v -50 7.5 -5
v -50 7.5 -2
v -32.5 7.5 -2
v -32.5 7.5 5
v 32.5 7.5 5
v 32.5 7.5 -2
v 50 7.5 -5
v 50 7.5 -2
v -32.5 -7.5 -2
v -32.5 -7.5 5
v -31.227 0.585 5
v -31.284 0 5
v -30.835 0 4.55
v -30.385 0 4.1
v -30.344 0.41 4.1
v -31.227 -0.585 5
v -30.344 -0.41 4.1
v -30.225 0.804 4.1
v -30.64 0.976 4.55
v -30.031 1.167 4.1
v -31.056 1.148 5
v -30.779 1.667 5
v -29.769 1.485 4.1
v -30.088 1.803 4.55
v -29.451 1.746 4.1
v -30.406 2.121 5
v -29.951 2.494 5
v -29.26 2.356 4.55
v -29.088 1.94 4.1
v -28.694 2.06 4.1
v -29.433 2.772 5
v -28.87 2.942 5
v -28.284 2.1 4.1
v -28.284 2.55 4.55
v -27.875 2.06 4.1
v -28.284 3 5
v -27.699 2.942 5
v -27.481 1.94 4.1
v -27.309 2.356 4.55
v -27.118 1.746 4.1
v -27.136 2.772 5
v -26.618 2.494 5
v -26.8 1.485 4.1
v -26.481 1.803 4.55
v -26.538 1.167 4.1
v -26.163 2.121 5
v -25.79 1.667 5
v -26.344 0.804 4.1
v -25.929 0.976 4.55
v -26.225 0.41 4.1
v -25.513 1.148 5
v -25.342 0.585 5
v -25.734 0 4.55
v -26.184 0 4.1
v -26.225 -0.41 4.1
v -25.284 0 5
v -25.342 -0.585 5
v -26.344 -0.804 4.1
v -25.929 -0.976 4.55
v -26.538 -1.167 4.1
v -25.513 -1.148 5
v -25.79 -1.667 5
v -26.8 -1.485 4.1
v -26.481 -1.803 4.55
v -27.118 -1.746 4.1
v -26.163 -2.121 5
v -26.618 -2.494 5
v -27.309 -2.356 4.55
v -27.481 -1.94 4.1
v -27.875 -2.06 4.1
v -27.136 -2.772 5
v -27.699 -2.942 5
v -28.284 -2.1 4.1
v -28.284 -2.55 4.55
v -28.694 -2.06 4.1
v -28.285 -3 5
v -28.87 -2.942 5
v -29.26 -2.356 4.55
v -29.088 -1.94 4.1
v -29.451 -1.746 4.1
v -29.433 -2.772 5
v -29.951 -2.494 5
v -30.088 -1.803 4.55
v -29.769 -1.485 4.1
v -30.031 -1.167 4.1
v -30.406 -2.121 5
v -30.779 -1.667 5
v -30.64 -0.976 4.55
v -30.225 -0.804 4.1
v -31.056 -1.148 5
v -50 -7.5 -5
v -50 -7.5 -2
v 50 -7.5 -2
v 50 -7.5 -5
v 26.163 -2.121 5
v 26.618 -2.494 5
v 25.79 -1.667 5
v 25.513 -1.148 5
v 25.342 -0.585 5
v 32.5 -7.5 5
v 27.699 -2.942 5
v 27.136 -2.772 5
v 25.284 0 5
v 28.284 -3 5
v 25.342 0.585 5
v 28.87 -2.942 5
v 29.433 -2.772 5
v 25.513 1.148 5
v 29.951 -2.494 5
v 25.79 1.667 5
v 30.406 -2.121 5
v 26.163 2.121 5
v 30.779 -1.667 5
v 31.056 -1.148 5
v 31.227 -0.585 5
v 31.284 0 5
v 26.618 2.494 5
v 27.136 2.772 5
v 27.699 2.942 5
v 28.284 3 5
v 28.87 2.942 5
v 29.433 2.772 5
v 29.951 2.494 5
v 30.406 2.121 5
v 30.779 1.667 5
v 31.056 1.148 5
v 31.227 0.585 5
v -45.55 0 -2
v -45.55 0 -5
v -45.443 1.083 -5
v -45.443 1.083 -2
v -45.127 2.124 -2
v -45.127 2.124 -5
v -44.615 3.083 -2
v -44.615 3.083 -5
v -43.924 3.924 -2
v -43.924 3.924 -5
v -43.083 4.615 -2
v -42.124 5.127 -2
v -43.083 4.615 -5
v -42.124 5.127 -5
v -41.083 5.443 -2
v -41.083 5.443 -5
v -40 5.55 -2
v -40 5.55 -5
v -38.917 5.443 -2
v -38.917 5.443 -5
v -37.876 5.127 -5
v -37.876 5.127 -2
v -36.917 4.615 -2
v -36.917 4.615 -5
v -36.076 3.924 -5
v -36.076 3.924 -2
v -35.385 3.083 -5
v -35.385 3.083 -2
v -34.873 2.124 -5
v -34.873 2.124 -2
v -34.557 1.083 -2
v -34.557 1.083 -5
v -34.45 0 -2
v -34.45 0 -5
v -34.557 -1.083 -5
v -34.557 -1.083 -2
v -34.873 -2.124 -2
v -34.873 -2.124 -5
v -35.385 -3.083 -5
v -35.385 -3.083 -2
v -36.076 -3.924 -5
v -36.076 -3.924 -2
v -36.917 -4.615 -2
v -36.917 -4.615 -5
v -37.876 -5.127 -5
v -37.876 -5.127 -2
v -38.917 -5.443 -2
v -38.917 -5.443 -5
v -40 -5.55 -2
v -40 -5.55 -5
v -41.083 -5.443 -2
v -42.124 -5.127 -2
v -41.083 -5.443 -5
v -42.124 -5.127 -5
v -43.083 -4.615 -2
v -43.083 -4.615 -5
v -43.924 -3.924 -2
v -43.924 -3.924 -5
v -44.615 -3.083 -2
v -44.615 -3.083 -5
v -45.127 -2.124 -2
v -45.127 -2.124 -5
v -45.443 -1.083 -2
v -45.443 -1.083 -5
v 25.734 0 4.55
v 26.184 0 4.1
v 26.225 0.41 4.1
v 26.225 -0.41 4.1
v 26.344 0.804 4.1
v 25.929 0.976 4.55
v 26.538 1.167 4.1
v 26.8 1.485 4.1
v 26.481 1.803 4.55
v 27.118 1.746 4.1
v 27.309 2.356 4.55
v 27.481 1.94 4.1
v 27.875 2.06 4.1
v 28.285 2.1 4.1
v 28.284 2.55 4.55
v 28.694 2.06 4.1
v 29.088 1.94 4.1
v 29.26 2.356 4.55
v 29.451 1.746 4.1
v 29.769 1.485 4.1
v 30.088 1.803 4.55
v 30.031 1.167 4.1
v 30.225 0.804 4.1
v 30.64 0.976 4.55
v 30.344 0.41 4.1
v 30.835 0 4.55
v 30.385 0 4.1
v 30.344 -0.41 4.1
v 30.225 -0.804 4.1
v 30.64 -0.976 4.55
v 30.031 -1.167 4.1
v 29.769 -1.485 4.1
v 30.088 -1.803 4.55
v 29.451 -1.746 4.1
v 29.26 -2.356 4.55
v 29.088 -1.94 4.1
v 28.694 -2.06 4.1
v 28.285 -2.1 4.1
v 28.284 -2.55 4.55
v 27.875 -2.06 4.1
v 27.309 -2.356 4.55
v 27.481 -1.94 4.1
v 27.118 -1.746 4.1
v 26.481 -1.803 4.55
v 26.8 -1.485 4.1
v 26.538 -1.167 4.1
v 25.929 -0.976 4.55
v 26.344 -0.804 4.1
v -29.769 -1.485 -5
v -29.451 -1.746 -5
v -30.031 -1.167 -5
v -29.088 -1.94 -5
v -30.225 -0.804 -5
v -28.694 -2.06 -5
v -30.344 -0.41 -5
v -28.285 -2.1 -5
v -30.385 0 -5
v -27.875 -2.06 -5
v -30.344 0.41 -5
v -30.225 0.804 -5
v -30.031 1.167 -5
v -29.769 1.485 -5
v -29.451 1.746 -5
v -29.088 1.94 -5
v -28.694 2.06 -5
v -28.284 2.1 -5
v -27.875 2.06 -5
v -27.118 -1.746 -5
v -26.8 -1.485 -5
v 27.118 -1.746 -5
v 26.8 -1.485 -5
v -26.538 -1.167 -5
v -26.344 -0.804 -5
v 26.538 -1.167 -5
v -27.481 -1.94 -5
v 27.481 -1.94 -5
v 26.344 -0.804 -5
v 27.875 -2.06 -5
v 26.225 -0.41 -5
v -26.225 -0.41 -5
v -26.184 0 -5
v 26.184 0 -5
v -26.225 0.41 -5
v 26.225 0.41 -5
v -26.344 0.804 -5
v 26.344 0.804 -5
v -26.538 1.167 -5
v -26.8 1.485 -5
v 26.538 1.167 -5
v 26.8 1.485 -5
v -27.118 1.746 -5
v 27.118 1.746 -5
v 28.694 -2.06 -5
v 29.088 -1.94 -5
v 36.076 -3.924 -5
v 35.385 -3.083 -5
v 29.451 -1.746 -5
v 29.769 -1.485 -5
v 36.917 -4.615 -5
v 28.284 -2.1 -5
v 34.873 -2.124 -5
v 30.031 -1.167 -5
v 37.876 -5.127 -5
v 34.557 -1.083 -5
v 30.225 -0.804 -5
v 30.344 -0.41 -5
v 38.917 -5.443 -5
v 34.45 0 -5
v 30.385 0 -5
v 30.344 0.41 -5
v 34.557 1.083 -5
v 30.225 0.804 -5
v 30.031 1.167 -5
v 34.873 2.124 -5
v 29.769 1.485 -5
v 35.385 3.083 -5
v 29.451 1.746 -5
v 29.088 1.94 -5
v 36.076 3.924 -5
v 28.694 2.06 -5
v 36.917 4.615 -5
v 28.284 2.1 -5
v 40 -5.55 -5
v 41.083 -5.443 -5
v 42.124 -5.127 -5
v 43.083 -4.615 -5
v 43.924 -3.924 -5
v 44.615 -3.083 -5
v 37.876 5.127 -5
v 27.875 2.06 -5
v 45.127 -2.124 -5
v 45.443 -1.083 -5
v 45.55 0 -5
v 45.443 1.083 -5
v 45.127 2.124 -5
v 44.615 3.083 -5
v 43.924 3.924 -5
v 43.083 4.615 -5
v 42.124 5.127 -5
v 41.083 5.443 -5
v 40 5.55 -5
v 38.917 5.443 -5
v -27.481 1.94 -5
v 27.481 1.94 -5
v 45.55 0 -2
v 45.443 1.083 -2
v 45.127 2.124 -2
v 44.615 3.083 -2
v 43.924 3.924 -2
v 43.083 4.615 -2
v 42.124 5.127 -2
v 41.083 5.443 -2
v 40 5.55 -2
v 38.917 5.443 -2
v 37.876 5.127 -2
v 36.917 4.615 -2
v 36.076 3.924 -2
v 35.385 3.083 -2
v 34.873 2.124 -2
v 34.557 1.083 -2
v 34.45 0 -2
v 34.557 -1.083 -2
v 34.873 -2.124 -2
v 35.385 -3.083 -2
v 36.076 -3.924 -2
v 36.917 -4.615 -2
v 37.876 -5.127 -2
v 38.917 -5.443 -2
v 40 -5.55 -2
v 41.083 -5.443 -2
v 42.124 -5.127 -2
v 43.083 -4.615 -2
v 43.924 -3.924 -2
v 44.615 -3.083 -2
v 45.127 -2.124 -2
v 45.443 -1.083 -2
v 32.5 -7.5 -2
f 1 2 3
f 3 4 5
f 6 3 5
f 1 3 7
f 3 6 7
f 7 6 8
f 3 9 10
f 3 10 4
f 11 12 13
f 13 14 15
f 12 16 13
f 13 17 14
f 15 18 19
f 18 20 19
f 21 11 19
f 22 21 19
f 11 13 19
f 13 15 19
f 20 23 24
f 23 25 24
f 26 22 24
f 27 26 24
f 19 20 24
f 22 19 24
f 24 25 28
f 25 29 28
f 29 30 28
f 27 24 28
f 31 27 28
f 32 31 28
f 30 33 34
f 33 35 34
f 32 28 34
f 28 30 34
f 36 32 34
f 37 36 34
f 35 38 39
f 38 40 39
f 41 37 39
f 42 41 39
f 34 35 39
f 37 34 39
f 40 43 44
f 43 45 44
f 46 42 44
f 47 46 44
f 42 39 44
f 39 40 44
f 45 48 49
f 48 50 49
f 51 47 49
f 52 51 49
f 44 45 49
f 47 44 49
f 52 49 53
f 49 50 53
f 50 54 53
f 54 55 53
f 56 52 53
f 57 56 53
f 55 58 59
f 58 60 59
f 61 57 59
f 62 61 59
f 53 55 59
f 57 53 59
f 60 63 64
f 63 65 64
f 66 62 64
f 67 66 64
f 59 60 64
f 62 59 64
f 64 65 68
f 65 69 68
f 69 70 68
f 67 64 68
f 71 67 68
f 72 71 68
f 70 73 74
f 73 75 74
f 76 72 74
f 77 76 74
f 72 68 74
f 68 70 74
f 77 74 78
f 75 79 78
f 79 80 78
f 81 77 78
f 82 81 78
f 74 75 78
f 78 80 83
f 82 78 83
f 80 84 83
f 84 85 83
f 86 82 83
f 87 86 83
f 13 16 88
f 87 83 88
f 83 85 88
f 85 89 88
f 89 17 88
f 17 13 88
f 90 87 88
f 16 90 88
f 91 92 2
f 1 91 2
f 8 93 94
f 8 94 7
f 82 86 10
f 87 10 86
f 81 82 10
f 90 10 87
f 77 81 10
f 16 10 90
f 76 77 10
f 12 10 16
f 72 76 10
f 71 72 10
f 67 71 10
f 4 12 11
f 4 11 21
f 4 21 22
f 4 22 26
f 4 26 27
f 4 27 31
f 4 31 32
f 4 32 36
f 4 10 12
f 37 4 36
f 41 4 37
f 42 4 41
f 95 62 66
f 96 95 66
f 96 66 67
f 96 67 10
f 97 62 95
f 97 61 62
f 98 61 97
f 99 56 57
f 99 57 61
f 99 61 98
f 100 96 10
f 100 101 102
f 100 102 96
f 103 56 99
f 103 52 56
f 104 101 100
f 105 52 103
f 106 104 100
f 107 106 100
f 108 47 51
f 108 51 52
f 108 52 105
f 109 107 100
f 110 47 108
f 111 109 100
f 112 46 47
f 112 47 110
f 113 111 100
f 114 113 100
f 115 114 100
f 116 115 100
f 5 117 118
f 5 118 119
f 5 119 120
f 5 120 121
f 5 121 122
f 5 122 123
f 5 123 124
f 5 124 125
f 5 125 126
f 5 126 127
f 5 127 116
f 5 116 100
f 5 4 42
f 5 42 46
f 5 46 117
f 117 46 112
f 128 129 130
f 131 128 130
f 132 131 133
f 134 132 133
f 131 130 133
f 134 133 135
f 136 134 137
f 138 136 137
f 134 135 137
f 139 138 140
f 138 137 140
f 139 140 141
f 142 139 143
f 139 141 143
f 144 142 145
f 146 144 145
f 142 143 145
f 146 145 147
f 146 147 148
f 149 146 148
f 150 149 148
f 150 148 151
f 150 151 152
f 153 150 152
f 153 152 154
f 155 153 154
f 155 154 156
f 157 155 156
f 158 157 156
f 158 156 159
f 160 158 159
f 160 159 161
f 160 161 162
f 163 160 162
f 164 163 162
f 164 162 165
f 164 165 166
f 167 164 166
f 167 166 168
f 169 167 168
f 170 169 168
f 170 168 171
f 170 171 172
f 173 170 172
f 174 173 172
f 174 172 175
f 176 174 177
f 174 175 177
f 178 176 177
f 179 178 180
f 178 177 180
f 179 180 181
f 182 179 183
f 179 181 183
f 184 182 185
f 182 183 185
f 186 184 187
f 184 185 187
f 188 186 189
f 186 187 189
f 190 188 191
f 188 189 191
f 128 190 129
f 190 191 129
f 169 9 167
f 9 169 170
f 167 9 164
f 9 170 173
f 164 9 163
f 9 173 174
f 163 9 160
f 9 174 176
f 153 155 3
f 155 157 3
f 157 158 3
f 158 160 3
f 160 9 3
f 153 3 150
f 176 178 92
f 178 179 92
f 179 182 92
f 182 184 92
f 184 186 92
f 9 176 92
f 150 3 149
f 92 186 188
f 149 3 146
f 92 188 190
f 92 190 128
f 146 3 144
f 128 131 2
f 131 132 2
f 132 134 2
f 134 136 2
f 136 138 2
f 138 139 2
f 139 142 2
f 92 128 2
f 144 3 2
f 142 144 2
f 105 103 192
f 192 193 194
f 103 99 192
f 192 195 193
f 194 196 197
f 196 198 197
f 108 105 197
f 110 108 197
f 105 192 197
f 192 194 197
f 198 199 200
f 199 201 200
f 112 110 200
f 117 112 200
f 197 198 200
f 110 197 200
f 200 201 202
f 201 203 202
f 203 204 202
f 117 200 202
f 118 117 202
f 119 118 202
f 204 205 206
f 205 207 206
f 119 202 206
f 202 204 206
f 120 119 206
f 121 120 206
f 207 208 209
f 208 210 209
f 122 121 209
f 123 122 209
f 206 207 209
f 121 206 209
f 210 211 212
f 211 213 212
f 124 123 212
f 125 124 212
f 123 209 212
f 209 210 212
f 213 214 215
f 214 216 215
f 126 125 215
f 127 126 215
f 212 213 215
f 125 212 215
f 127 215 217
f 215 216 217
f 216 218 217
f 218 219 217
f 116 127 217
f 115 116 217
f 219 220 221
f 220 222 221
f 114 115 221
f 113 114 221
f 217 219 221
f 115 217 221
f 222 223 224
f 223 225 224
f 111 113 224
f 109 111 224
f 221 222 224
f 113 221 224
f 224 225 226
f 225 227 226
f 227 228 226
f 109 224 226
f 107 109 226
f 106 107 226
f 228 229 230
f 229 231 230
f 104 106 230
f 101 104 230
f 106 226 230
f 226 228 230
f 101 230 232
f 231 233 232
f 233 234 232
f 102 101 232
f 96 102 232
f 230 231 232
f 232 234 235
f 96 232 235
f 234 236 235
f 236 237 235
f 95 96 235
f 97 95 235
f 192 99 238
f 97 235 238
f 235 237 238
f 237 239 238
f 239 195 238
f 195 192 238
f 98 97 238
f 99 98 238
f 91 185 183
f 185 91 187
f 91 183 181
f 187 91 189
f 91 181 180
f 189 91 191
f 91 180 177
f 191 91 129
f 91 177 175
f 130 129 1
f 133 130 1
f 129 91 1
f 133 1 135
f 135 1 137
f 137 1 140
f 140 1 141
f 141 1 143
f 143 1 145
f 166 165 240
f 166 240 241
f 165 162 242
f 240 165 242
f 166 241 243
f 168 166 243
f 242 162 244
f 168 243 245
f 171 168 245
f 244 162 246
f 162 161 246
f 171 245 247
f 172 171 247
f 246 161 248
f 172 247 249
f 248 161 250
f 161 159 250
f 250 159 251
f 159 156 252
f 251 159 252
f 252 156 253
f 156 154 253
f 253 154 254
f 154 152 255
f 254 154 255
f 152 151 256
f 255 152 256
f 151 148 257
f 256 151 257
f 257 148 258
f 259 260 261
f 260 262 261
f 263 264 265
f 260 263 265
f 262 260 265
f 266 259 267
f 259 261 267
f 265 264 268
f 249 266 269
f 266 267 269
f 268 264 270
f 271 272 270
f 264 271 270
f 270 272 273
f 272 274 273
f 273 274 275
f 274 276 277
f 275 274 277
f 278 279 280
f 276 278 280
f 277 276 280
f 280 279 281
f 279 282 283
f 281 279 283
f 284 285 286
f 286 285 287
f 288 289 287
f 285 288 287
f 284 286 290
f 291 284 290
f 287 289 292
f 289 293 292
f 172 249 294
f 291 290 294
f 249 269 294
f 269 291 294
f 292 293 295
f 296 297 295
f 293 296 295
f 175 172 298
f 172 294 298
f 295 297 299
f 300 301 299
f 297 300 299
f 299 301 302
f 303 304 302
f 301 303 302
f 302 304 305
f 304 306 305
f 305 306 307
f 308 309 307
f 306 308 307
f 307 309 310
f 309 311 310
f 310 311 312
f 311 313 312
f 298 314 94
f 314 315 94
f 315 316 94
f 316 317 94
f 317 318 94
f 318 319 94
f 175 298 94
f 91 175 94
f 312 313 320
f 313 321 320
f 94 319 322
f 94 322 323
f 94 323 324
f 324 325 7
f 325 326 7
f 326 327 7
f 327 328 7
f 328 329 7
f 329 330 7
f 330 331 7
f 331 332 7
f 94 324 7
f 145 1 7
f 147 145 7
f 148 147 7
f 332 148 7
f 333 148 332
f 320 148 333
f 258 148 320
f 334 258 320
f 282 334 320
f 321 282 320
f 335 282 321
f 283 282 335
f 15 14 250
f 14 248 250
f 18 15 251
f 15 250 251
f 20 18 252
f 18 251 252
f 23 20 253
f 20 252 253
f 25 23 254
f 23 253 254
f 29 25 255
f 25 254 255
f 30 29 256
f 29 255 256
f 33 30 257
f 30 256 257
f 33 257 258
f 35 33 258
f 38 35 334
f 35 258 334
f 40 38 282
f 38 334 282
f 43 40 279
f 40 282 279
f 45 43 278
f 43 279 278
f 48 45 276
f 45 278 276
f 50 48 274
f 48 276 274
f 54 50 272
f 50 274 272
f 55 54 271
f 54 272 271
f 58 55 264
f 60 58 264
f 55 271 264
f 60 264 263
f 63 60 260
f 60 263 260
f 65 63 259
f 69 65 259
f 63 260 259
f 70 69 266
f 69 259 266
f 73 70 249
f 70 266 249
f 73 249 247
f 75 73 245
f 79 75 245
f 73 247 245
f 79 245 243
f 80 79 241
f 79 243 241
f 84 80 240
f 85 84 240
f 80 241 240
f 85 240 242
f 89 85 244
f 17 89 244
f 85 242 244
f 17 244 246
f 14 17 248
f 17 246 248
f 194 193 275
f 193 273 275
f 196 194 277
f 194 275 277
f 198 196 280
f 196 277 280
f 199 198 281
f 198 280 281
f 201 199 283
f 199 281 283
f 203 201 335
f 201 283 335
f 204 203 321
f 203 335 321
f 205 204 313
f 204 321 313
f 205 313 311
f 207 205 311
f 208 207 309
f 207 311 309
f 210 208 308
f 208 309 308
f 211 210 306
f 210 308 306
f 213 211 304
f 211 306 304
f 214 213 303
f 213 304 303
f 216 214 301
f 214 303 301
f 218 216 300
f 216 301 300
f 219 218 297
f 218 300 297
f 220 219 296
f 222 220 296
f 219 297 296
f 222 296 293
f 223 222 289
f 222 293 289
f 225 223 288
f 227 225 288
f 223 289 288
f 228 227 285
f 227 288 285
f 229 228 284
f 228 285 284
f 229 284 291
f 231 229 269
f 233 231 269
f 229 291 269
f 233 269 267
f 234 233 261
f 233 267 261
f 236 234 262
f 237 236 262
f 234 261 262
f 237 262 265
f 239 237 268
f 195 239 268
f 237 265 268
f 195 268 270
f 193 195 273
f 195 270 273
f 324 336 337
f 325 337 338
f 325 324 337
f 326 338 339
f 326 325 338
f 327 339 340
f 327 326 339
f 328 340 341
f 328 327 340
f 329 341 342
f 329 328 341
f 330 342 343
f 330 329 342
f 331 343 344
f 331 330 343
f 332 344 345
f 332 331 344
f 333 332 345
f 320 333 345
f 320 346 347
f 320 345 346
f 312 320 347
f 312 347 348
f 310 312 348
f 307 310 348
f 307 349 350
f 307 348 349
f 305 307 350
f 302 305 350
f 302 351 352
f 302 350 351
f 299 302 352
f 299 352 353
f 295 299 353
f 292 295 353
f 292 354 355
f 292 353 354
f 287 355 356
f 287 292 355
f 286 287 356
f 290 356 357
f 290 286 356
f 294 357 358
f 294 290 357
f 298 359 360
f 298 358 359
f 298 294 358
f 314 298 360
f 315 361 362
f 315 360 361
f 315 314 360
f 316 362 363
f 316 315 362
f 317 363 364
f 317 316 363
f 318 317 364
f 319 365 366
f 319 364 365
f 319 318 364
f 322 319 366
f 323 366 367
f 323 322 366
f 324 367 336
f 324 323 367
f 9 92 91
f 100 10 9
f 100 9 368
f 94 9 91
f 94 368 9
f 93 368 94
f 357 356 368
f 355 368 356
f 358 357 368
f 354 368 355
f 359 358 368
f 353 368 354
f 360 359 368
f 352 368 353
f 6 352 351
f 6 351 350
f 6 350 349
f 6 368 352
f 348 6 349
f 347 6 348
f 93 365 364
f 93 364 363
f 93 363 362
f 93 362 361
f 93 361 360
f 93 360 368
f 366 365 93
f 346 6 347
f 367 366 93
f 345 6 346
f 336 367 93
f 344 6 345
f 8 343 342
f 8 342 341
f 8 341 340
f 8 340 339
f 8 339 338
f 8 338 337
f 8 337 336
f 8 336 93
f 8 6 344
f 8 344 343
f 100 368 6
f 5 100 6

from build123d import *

# Parameters (mm, degrees)
SKETCH1_W                       = 100
SKETCH1_H                       = 15
BOSS_EXTRUDE1_DEPTH             = 5
M5X0_8_TAPPED_HOLE1_D           = 4.2
M5X0_8_TAPPED_HOLE1_DEPTH       = 12.4
M5X0_8_TAPPED_HOLE1_CSINK_D     = 6
M5X0_8_TAPPED_HOLE1_CSINK_ANGLE = 90
M5X0_8_TAPPED_HOLE1_TIP         = 1.2618073
SKETCH6_R                       = 5.5499
CUT_EXTRUDE1_DEPTH              = 52.53882032
CUT_EXTRUDE2_START              = -3
SKETCH7_W                       = 17.5
SKETCH7_H                       = 15
CUT_EXTRUDE2_DEPTH              = 49.53882032


with BuildPart() as part:
    # Sketch1 → Boss-Extrude1 (new, symmetric)
    with BuildSketch(Plane.XY):
        Rectangle(SKETCH1_W, SKETCH1_H)
    extrude(amount=BOSS_EXTRUDE1_DEPTH, both=True)

    # M5x0.8 Tapped Hole1
    with Locations(Plane.XY.offset(5)):
        with Locations((-28.2845, 0), (28.2845, 0)):
            CounterSinkHole(M5X0_8_TAPPED_HOLE1_D / 2, M5X0_8_TAPPED_HOLE1_CSINK_D / 2, depth=M5X0_8_TAPPED_HOLE1_DEPTH, counter_sink_angle=M5X0_8_TAPPED_HOLE1_CSINK_ANGLE)
            with Locations((0, 0, -(M5X0_8_TAPPED_HOLE1_DEPTH + M5X0_8_TAPPED_HOLE1_TIP / 2))):  # 118° drill point
                Cone(0, M5X0_8_TAPPED_HOLE1_D / 2, M5X0_8_TAPPED_HOLE1_TIP, mode=Mode.SUBTRACT)

    # Sketch6 → Cut-Extrude1 (cut, through all)
    with BuildSketch(Plane(origin=(0, 0, -5), x_dir=(-1, 0, 0), z_dir=(0, 0, -1))):
        with Locations((40, 0)):
            Circle(SKETCH6_R)
    cut_extrude1 = extrude(amount=-CUT_EXTRUDE1_DEPTH, mode=Mode.SUBTRACT)

    # Sketch7 → Cut-Extrude2 (cut, through all)
    with BuildSketch(Plane(origin=(0, 0, -5), x_dir=(-1, 0, 0), z_dir=(0, 0, -1)).offset(CUT_EXTRUDE2_START)):
        with Locations((41.25, 0)):
            Rectangle(SKETCH7_W, SKETCH7_H)
    cut_extrude2 = extrude(amount=-CUT_EXTRUDE2_DEPTH, mode=Mode.SUBTRACT)

    # Mirror1: Cut-Extrude1, Cut-Extrude2 across plane
    add(cut_extrude1.mirror(Plane(origin=(0, 0, 0), x_dir=(0, 0, 1), z_dir=(1, 0, 0))), mode=Mode.SUBTRACT)
    add(cut_extrude2.mirror(Plane(origin=(0, 0, 0), x_dir=(0, 0, 1), z_dir=(1, 0, 0))), mode=Mode.SUBTRACT)


solid = part.part
